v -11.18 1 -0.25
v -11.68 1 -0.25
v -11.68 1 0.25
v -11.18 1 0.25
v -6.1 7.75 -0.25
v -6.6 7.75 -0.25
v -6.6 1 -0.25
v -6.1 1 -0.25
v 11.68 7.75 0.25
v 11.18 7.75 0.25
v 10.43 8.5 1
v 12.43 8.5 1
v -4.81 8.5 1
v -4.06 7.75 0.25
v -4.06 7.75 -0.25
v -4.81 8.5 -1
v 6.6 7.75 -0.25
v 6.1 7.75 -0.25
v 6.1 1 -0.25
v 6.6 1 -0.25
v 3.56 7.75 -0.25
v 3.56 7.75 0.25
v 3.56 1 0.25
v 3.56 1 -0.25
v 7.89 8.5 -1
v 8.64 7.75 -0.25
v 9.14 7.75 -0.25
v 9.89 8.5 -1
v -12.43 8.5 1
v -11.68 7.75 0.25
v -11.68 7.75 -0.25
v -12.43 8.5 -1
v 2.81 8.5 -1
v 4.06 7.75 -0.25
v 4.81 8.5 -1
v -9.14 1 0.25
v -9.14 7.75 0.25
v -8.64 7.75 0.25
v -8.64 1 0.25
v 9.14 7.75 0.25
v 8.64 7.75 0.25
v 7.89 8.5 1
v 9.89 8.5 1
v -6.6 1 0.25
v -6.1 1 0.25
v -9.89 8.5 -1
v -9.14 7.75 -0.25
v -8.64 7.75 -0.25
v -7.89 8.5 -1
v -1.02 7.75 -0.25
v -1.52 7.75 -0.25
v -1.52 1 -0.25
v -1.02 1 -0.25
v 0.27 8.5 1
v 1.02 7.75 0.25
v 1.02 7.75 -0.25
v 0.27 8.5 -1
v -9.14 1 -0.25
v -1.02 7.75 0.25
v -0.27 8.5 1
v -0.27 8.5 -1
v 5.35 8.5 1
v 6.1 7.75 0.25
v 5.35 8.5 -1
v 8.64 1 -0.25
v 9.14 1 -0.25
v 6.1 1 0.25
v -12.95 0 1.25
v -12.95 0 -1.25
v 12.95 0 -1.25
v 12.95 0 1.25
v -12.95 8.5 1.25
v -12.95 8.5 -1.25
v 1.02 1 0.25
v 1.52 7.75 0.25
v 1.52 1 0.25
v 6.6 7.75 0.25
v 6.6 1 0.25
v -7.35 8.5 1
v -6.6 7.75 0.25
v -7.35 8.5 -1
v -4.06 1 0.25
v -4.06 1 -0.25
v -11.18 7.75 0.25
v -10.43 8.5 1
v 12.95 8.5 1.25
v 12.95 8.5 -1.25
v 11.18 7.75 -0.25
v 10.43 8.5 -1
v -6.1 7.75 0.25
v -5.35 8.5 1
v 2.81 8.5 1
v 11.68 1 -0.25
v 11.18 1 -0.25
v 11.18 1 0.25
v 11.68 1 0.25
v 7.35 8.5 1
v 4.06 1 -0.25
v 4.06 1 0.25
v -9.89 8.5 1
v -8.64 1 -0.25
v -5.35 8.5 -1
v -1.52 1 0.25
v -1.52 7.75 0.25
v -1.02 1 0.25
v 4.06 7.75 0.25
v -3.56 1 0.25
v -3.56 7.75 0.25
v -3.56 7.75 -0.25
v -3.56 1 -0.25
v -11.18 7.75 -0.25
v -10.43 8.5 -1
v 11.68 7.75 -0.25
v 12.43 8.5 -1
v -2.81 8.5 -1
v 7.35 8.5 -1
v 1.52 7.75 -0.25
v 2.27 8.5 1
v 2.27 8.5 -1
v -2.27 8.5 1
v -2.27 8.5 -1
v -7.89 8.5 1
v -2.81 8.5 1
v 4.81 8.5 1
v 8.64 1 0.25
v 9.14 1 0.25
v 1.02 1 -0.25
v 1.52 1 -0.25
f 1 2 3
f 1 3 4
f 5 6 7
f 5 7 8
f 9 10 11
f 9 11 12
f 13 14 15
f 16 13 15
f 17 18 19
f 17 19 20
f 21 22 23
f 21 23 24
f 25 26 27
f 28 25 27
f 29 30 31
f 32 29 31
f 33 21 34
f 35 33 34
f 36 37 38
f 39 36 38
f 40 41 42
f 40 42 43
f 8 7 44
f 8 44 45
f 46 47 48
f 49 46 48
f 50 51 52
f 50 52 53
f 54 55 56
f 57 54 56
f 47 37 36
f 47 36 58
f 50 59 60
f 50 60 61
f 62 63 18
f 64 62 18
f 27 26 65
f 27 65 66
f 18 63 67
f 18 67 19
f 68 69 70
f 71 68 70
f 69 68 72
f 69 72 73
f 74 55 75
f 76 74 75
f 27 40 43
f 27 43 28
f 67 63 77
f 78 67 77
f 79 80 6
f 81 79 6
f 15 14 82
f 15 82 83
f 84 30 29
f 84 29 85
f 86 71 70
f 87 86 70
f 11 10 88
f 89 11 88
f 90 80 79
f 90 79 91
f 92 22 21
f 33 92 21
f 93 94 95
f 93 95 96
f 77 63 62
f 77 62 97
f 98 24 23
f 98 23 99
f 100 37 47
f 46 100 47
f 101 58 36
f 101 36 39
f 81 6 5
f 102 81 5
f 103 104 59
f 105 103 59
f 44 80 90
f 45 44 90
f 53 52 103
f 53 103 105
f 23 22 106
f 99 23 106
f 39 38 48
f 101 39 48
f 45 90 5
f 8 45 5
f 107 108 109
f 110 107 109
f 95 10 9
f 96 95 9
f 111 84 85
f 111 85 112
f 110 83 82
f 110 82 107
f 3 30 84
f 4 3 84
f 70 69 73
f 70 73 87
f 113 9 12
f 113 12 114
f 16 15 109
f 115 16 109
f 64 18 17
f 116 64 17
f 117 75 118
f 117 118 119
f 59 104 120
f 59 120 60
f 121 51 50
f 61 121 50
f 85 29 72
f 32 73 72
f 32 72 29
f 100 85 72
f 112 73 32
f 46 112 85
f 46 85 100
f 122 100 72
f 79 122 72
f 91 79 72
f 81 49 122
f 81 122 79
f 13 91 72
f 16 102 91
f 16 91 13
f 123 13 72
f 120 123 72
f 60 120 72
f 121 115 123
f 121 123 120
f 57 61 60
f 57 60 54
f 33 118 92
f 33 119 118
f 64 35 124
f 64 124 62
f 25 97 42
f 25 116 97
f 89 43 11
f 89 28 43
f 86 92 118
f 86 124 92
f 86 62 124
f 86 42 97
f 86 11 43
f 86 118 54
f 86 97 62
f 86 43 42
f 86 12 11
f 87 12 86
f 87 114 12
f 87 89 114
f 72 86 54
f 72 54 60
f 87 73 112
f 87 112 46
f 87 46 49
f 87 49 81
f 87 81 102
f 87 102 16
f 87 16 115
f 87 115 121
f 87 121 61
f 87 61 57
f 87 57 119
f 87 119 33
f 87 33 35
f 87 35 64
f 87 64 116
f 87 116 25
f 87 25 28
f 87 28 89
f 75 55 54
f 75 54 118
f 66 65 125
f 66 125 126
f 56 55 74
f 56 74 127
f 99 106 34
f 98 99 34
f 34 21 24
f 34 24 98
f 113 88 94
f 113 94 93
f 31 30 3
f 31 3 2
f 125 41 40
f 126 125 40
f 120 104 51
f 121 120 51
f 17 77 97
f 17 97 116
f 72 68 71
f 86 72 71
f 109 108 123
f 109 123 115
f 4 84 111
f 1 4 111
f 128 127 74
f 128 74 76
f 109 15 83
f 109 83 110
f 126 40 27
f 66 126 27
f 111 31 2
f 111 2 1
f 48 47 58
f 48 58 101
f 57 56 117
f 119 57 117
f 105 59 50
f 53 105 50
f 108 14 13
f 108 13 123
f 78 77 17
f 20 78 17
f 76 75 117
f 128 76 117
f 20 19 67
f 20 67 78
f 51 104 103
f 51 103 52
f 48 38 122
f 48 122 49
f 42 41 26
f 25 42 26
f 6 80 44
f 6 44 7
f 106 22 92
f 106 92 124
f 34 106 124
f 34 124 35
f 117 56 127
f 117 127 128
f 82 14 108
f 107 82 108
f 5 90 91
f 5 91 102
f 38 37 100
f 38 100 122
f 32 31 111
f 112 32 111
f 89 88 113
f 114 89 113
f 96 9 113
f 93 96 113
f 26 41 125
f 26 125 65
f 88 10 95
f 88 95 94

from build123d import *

# Parameters (mm, degrees)
SKETCH_1_W                         = 25.9
SKETCH_1_H                         = 2.5
EXTRUDE_1_DEPTH                    = 8.5
SKETCH_2_W                         = 0.5
SKETCH_2_H                         = 0.5
CUT_EXTRUDE_1_DEPTH                = 7.5
CHAMFER_1_SIZE                     = 0.75
SKETCH_6_W                         = 0.5
SKETCH_6_H                         = 0.5
CUT_EXTRUDE_3_DEPTH                = 7.5
CHAMFER_3_SIZE                     = 0.75
PATTERN_LINEAR_1_COUNT             = 5
PATTERN_LINEAR_1_PITCH             = 2.54
CHAMFER_3_OF_PATTERN_LINEAR_1_SIZE = 0.75
PATTERN_LINEAR_2_COUNT             = 5
PATTERN_LINEAR_2_PITCH             = 2.54
CHAMFER_1_OF_PATTERN_LINEAR_2_SIZE = 0.75


with BuildPart() as part:
    # Эскиз1 → Бобышка-Вытянуть1 (new body)
    with BuildSketch(Plane(origin=(0, 0, 0), x_dir=(1, 0, 0), z_dir=(0, 1, 0))):
        Rectangle(SKETCH_1_W, SKETCH_1_H)
    extrude(amount=EXTRUDE_1_DEPTH)

    # Эскиз2 → Вырез-Вытянуть1 (cut)
    with BuildSketch(Plane(origin=(0, 8.5, 0), x_dir=(1, 0, 0), z_dir=(0, 1, 0))):
        with Locations((1.27, 0)):
            Rectangle(SKETCH_2_W, SKETCH_2_H)
    cut_extrude_1 = extrude(amount=-CUT_EXTRUDE_1_DEPTH, mode=Mode.SUBTRACT)

    # Фаска1
    chamfer_1_edges = [part.edges().sort_by_distance(p)[0] for p in [
        (1.52, 8.5, 0),
        (1.27, 8.5, -0.25),
        (1.02, 8.5, 0),
        (1.27, 8.5, 0.25),
    ]]
    chamfer(chamfer_1_edges, length=CHAMFER_1_SIZE)

    # Эскиз6 → Вырез-Вытянуть3 (cut)
    with BuildSketch(Plane(origin=(0, 8.5, 0), x_dir=(1, 0, 0), z_dir=(0, 1, 0))):
        with Locations((-1.27, 0)):
            Rectangle(SKETCH_6_W, SKETCH_6_H)
    cut_extrude_3 = extrude(amount=-CUT_EXTRUDE_3_DEPTH, mode=Mode.SUBTRACT)

    # Фаска3
    chamfer_3_edges = [part.edges().sort_by_distance(p)[0] for p in [
        (-1.02, 8.5, 0),
        (-1.27, 8.5, -0.25),
        (-1.52, 8.5, 0),
        (-1.27, 8.5, 0.25),
    ]]
    chamfer(chamfer_3_edges, length=CHAMFER_3_SIZE)

    # Линейный массив1: Вырез-Вытянуть3 ×5
    with Locations(*[(-i * PATTERN_LINEAR_1_PITCH, 0, 0) for i in range(1, PATTERN_LINEAR_1_COUNT)]):
        add(cut_extrude_3, mode=Mode.SUBTRACT)

    # Фаска3 of Линейный массив1
    chamfer_3_of_pattern_linear_1_edges = [part.edges().sort_by_distance(p)[0] for p in [
        (-3.56, 8.5, 0),
        (-3.81, 8.5, -0.25),
        (-4.06, 8.5, 0),
        (-3.81, 8.5, 0.25),
        (-6.1, 8.5, 0),
        (-6.35, 8.5, -0.25),
        (-6.6, 8.5, 0),
        (-6.35, 8.5, 0.25),
        (-8.64, 8.5, 0),
        (-8.89, 8.5, -0.25),
        (-9.14, 8.5, 0),
        (-8.89, 8.5, 0.25),
        (-11.18, 8.5, 0),
        (-11.43, 8.5, -0.25),
        (-11.68, 8.5, 0),
        (-11.43, 8.5, 0.25),
    ]]
    chamfer(chamfer_3_of_pattern_linear_1_edges, length=CHAMFER_3_OF_PATTERN_LINEAR_1_SIZE)

    # Линейный массив2: Вырез-Вытянуть1 ×5
    with Locations(*[(i * PATTERN_LINEAR_2_PITCH, 0, 0) for i in range(1, PATTERN_LINEAR_2_COUNT)]):
        add(cut_extrude_1, mode=Mode.SUBTRACT)

    # Фаска1 of Линейный массив2
    chamfer_1_of_pattern_linear_2_edges = [part.edges().sort_by_distance(p)[0] for p in [
        (4.06, 8.5, 0),
        (3.81, 8.5, -0.25),
        (3.56, 8.5, 0),
        (3.81, 8.5, 0.25),
        (6.6, 8.5, 0),
        (6.35, 8.5, -0.25),
        (6.1, 8.5, 0),
        (6.35, 8.5, 0.25),
        (9.14, 8.5, 0),
        (8.89, 8.5, -0.25),
        (8.64, 8.5, 0),
        (8.89, 8.5, 0.25),
        (11.68, 8.5, 0),
        (11.43, 8.5, -0.25),
        (11.18, 8.5, 0),
        (11.43, 8.5, 0.25),
    ]]
    chamfer(chamfer_1_of_pattern_linear_2_edges, length=CHAMFER_1_OF_PATTERN_LINEAR_2_SIZE)


solid = part.part
